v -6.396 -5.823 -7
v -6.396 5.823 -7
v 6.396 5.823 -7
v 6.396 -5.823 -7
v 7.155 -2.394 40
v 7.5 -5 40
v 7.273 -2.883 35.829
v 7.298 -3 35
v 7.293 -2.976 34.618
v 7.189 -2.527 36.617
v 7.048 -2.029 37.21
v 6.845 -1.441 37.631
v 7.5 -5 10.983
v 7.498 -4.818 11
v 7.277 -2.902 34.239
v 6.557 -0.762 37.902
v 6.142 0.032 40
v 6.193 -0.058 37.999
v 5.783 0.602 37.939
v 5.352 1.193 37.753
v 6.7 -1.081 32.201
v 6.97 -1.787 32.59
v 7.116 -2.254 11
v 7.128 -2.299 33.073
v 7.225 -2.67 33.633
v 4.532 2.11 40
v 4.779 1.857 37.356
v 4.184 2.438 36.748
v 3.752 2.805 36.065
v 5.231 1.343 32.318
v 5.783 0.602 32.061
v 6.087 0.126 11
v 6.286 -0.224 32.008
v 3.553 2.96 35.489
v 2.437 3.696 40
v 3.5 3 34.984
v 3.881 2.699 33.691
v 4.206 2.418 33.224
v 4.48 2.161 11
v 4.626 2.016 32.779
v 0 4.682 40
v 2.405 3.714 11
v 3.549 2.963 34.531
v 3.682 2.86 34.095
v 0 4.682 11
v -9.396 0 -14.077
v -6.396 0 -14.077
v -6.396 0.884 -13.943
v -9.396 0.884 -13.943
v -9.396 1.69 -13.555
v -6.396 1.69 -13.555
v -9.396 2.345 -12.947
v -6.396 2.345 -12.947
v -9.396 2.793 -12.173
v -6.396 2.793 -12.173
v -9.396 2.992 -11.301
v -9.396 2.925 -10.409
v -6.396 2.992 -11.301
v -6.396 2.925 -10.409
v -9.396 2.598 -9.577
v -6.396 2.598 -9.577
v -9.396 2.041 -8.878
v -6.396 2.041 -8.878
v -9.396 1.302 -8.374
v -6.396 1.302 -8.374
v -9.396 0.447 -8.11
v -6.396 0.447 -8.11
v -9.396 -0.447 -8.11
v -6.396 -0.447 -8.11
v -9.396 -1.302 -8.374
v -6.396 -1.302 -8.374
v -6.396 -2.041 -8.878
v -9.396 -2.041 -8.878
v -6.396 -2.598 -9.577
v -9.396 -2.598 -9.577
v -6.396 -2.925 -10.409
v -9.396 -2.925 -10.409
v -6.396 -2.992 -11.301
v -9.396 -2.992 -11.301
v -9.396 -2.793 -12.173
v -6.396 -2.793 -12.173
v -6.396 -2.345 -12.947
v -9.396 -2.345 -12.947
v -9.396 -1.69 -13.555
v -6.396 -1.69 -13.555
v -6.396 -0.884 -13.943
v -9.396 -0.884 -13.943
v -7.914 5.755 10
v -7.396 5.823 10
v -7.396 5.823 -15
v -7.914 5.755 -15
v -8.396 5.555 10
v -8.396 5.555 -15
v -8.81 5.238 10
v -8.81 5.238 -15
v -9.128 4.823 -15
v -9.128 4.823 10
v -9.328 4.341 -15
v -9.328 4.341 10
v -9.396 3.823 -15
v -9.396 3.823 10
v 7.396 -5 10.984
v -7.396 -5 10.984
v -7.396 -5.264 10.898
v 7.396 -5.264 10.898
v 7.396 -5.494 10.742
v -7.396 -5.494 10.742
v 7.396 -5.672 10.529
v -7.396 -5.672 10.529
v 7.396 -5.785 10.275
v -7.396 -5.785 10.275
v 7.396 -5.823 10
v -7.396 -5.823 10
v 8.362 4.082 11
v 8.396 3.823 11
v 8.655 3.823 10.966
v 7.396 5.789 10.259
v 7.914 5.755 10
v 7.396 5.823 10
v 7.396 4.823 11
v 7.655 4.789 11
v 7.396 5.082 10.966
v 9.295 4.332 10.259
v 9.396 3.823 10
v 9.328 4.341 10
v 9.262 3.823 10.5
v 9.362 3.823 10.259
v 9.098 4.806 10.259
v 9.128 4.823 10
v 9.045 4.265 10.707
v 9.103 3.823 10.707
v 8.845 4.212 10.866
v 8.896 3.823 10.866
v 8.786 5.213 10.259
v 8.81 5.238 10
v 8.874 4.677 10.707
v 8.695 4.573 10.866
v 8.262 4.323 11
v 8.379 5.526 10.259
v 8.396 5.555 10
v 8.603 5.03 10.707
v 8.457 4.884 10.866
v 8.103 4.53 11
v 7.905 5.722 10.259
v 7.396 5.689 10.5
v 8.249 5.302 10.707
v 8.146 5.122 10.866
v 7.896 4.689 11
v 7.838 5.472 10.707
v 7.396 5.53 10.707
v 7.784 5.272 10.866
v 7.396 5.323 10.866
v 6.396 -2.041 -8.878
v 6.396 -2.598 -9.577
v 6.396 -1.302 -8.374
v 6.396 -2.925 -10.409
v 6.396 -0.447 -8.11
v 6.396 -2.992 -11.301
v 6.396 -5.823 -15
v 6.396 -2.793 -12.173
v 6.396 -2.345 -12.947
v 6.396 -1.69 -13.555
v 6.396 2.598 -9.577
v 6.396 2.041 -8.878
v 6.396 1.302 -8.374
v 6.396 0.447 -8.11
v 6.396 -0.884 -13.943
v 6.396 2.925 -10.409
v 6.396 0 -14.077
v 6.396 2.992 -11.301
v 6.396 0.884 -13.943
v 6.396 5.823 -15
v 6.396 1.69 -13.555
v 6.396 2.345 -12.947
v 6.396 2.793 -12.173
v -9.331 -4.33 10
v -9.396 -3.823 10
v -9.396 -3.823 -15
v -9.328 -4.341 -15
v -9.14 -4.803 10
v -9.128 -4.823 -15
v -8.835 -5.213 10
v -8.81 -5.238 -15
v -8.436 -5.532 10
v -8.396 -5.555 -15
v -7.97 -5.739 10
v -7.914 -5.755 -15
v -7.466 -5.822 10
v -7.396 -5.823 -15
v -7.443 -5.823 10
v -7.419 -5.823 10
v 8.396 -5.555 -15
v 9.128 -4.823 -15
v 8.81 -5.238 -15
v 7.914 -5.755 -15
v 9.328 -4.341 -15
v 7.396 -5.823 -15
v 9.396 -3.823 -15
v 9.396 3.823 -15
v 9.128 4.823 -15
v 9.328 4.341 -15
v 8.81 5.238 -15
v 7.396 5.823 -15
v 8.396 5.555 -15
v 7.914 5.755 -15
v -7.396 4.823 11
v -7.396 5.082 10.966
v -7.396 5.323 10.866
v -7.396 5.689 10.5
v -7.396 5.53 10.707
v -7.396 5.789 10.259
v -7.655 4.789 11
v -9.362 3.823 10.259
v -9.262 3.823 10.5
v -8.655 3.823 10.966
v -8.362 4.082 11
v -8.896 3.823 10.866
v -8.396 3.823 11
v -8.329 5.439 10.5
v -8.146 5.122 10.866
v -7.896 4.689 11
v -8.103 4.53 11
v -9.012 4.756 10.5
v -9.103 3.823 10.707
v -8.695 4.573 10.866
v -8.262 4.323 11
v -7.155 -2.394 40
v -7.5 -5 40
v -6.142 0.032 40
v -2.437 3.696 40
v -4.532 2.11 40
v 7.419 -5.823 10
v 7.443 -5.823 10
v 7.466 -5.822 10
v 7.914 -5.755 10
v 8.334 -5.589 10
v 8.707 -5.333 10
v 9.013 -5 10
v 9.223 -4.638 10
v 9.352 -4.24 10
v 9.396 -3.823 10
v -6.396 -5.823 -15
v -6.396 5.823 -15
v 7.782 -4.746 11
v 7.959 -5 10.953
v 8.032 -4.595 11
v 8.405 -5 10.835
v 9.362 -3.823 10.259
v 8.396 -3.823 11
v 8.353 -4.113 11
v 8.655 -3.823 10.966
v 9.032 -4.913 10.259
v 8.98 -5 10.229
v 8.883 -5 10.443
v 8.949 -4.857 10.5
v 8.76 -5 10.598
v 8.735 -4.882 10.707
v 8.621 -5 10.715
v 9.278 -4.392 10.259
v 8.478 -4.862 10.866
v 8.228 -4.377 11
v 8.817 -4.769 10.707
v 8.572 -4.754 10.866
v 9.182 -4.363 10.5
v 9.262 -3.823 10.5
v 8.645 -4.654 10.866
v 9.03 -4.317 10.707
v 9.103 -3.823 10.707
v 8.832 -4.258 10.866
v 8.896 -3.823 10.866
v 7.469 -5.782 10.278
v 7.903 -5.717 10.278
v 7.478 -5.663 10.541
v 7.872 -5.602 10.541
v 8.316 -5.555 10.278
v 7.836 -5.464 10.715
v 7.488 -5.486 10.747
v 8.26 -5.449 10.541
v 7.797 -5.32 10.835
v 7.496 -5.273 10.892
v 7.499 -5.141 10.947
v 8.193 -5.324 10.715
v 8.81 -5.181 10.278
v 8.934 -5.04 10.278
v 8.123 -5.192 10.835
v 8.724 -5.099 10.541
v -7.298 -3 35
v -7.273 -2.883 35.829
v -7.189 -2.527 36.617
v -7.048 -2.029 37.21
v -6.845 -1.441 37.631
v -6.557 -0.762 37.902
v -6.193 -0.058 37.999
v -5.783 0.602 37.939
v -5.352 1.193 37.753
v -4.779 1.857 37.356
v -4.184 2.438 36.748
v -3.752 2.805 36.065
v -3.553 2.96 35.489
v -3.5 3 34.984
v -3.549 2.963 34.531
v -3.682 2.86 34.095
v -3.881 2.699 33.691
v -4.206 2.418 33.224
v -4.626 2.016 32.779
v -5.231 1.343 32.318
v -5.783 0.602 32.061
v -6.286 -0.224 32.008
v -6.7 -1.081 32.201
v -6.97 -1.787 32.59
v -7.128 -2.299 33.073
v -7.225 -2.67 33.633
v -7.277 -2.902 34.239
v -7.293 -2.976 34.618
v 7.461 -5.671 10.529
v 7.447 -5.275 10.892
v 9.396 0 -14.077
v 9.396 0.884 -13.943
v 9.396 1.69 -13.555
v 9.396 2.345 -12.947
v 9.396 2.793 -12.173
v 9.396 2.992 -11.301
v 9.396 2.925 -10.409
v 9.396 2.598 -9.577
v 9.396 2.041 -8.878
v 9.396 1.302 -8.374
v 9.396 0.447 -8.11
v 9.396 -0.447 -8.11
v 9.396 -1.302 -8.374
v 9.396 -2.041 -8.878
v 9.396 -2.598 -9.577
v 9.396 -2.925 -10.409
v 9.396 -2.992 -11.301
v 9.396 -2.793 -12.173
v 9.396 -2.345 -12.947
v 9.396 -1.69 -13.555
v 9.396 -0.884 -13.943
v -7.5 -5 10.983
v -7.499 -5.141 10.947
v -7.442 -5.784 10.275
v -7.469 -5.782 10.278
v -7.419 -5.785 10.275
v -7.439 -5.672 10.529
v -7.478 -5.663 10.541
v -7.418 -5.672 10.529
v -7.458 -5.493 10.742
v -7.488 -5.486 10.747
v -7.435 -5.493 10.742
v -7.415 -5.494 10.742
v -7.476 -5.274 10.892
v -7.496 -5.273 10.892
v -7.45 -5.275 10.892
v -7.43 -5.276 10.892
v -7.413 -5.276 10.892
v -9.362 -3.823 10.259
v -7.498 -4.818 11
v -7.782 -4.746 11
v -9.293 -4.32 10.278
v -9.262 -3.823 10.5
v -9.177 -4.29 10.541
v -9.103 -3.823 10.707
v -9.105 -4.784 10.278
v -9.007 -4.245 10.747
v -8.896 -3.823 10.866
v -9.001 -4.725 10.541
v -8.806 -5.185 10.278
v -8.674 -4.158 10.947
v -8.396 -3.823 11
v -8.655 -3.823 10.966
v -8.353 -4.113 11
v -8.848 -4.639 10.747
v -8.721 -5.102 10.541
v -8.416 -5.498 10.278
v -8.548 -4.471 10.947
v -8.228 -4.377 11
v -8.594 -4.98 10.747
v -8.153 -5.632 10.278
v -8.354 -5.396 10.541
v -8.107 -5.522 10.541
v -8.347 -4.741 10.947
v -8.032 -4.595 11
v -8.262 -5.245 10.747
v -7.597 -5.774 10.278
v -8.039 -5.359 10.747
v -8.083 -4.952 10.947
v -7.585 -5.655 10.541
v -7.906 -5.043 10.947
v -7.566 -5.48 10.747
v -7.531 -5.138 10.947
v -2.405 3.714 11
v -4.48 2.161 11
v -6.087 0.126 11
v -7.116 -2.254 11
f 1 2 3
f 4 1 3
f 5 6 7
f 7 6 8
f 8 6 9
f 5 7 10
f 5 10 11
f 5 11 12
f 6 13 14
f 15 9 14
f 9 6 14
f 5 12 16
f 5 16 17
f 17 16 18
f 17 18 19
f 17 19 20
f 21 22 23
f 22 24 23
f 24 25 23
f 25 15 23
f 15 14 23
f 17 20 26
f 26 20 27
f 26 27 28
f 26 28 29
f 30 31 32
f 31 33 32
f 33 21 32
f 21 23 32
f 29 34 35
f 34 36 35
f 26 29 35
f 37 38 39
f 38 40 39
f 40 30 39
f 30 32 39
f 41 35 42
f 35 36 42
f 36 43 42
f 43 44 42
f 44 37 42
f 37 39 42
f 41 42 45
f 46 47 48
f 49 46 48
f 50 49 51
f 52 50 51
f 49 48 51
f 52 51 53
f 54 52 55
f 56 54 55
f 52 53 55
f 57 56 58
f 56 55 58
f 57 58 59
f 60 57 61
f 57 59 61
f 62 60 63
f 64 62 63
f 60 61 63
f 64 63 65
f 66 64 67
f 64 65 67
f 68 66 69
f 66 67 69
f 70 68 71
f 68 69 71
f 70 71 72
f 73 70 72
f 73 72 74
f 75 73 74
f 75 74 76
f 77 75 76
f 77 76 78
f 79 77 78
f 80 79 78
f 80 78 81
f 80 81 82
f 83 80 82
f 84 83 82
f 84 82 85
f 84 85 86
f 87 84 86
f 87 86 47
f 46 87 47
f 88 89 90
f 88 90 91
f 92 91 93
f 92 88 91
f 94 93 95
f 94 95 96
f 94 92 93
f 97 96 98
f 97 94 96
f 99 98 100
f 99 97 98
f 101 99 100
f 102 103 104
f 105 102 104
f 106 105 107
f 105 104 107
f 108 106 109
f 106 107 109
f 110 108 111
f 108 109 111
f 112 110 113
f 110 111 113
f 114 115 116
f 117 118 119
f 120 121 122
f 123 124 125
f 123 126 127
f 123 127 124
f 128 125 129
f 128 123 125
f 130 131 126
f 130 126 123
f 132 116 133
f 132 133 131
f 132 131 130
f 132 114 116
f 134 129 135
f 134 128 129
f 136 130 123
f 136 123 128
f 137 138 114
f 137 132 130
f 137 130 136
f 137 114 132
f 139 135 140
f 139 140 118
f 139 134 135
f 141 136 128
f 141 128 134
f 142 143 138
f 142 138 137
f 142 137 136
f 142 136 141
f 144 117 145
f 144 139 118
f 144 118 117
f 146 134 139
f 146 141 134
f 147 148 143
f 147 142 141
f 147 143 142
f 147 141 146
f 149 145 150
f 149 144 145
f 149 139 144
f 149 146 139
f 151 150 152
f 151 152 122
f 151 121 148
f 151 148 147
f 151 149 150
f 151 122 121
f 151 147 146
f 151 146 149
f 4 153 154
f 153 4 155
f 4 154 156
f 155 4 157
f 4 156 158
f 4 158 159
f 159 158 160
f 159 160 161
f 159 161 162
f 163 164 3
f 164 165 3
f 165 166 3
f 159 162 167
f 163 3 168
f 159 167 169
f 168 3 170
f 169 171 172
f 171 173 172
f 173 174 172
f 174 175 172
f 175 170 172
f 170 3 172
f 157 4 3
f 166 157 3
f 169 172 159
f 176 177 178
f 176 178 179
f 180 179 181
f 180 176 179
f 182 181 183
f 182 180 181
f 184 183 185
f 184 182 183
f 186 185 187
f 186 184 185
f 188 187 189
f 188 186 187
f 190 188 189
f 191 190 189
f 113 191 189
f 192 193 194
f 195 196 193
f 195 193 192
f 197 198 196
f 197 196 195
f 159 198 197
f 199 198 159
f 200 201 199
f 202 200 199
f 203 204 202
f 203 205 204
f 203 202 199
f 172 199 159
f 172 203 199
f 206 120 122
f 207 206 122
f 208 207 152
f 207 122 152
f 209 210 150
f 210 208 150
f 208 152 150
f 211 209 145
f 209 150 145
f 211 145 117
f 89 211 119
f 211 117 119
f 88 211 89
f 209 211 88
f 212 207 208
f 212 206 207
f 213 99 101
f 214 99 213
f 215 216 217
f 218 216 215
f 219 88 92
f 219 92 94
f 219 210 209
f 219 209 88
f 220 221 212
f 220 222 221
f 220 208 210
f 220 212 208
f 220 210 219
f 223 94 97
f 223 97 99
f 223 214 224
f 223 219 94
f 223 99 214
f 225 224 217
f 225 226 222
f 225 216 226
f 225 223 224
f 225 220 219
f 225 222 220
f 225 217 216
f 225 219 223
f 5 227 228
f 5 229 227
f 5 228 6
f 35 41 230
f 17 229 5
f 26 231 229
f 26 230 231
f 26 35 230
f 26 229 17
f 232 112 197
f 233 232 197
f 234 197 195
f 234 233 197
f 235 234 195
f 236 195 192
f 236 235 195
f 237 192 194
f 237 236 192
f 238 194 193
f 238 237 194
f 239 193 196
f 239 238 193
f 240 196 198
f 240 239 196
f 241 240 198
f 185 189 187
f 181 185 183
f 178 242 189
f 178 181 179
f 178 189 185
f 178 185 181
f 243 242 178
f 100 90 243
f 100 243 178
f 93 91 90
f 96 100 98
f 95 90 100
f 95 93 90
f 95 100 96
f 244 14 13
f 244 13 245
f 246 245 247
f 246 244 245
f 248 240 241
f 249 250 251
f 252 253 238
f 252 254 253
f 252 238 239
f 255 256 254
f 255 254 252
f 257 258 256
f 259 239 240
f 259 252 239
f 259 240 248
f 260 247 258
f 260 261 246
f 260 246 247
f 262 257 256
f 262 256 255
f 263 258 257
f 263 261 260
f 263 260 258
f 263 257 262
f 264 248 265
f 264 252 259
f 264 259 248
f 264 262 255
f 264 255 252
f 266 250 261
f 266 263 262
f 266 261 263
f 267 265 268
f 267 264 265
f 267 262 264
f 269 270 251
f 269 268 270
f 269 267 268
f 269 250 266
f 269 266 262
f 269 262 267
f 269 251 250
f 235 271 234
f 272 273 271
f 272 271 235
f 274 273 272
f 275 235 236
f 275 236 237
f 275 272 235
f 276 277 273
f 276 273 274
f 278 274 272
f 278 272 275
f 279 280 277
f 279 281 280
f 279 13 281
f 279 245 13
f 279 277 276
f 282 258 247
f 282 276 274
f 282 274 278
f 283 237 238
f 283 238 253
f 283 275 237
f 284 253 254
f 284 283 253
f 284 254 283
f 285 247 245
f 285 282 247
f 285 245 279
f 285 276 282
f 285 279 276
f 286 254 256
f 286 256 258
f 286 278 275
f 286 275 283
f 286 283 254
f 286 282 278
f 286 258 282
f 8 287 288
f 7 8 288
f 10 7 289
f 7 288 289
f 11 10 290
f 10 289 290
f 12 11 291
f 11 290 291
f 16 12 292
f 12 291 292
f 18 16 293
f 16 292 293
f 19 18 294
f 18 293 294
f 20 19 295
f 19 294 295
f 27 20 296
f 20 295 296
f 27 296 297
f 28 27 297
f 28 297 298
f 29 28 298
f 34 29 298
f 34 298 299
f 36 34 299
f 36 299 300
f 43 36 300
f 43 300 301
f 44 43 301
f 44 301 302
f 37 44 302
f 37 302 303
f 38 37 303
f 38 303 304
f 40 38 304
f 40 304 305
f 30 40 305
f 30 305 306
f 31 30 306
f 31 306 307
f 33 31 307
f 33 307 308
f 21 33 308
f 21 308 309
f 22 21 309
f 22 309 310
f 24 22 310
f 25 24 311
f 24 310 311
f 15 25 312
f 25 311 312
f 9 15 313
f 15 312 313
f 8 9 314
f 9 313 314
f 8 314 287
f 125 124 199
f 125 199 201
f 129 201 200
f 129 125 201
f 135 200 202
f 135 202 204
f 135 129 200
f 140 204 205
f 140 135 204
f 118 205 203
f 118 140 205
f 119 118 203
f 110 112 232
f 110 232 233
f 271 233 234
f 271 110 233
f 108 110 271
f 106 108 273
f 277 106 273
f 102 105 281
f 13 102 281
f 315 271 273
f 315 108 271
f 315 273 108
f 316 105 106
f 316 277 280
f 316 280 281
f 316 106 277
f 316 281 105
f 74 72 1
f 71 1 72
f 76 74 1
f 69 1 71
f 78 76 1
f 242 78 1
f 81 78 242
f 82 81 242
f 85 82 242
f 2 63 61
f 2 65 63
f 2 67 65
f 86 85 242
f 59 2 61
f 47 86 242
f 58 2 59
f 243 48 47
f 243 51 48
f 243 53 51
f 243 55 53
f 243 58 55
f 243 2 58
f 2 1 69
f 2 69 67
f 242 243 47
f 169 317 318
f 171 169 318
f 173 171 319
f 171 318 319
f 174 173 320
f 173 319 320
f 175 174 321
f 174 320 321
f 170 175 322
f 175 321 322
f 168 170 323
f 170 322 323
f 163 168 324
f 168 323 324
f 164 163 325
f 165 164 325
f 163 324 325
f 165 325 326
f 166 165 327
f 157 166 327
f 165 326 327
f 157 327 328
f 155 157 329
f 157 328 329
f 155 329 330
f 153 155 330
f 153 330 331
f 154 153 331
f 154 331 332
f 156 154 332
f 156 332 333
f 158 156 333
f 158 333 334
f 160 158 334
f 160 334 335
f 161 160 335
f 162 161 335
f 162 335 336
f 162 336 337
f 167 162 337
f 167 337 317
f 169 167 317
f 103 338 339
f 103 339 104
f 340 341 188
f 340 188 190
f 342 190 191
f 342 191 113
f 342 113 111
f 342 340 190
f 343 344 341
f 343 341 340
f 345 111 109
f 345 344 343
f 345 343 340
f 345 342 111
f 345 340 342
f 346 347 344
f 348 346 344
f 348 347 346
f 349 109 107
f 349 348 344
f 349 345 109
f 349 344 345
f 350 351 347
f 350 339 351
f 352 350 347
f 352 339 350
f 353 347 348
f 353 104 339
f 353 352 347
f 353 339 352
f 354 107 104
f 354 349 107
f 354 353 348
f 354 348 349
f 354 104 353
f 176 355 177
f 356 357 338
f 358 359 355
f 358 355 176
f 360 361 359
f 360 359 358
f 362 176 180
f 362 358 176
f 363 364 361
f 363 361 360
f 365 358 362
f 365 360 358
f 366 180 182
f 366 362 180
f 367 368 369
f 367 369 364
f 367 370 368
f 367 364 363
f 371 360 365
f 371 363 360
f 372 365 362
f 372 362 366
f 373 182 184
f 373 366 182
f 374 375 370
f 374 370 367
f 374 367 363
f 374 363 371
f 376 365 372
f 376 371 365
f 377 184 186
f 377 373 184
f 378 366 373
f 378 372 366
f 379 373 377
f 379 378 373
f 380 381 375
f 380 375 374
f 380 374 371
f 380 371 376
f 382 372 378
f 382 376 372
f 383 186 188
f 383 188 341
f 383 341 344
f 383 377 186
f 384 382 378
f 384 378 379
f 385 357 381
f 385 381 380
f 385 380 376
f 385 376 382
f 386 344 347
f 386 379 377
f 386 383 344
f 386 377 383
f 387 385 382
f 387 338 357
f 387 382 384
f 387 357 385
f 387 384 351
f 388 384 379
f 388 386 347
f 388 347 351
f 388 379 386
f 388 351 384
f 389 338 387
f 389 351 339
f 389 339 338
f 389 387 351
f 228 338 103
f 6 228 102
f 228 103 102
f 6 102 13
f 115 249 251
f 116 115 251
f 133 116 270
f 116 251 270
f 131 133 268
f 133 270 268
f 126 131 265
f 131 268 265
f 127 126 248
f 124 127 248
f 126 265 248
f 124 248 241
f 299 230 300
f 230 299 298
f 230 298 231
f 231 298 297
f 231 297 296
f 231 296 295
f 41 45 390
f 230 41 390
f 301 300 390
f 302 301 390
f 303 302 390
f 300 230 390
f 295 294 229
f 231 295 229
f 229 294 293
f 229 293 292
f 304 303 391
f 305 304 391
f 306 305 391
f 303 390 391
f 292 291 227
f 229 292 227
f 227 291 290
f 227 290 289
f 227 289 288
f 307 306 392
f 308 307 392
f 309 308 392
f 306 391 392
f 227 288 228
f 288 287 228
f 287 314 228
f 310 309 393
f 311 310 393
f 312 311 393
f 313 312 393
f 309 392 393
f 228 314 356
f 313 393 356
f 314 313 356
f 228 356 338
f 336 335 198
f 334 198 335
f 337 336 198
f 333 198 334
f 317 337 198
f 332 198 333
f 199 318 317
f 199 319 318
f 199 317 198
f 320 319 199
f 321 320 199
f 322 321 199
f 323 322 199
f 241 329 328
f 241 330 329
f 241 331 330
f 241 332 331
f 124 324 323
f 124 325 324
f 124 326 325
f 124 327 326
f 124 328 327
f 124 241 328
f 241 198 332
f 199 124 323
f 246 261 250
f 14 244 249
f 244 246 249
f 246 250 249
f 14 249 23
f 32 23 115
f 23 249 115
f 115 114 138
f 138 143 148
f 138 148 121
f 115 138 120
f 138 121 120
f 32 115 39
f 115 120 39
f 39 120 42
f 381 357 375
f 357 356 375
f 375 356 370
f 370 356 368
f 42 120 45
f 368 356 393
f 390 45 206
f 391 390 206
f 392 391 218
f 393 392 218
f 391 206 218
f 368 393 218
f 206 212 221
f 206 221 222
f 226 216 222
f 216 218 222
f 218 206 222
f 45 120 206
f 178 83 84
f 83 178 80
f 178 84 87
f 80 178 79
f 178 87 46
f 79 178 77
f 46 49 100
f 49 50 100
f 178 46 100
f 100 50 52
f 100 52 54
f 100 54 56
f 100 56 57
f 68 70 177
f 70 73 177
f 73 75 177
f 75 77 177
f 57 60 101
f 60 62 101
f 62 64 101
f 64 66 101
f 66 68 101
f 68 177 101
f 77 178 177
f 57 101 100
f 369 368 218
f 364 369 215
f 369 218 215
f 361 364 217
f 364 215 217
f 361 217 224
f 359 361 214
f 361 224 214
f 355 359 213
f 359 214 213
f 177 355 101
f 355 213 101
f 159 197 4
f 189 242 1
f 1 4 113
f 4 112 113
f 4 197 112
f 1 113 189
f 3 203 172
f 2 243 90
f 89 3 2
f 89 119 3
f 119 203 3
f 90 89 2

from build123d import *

# Parameters (mm, degrees)
SKETCH1_W                = 15
SKETCH1_H                = 10
BOSS_EXTRUDE1_DEPTH      = 40
BOSS_EXTRUDE2_DEPTH      = 15
BOSS_EXTRUDE2_DEPTH_BACK = 11
SKETCH3_W                = 18.791763322
SKETCH3_H                = 11.646727992
SKETCH4_W                = 12.791763322
SKETCH4_H                = 8
CUT_EXTRUDE1_DEPTH       = 43.707480201
SKETCH5_R                = 3
CUT_EXTRUDE2_DEPTH       = 44.810756502
CUT_EXTRUDE3_DEPTH       = 49.282441533
CUT_EXTRUDE3_DEPTH_BACK  = 49.282441533
SKETCH6_OUTSIDE_W        = 32.648
SKETCH6_OUTSIDE_H        = 25.502
FILLET1_R                = 10
FILLET2_R                = 1
SKETCH7_R                = 3
CUT_EXTRUDE4_DEPTH       = 45.576248719


with BuildPart() as part:
    # Sketch1 → Boss-Extrude1 (new body)
    with BuildSketch(Plane.XY):
        Rectangle(SKETCH1_W, SKETCH1_H)
    extrude(amount=BOSS_EXTRUDE1_DEPTH)

    # Sketch3 → Boss-Extrude2 (add, two sides: drawn at the far end of the back side and taken through both)
    with BuildSketch(Plane(origin=(0, 0, 0), x_dir=(-1, 0, 0), z_dir=(0, 0, -1)).offset(-BOSS_EXTRUDE2_DEPTH_BACK)):
        Rectangle(SKETCH3_W, SKETCH3_H)
    extrude(amount=BOSS_EXTRUDE2_DEPTH + BOSS_EXTRUDE2_DEPTH_BACK)

    # Sketch4 → Cut-Extrude1 (cut, through all)
    with BuildSketch(Plane(origin=(0, 5.823363996, 0), x_dir=(1, 0, 0), z_dir=(0, 1, 0))):
        with Locations((0, 11)):
            Rectangle(SKETCH4_W, SKETCH4_H)
    extrude(amount=-CUT_EXTRUDE1_DEPTH, mode=Mode.SUBTRACT)

    # Sketch5 → Cut-Extrude2 (cut, through all)
    with BuildSketch(Plane.ZY.offset(7.5)):
        with Locations(Location((35, 0, 0), (0, 0, 270))):
            Circle(SKETCH5_R)
    extrude(amount=-CUT_EXTRUDE2_DEPTH, mode=Mode.SUBTRACT)

    # Sketch6 outside → Cut-Extrude3 (cut, two sides: drawn at the far end of the back side and taken through both)
    with BuildSketch(Plane(origin=(0, 0, -7), x_dir=(-1, 0, 0), z_dir=(0, 0, -1)).offset(-CUT_EXTRUDE3_DEPTH_BACK)):
        Rectangle(SKETCH6_OUTSIDE_W, SKETCH6_OUTSIDE_H)
        with BuildLine():
            Line((-7.395881661, 5.823363996), (7.395881661, 5.823363996))
            ThreePointArc((7.395881661, 5.823363996), (8.810095223, 5.237577558), (9.395881661, 3.823363996))
            Line((9.395881661, 3.823363996), (9.395881661, -3.823363996))
            ThreePointArc((9.395881661, -3.823363996), (8.810095223, -5.237577558), (7.395881661, -5.823363996))
            Line((7.395881661, -5.823363996), (-7.395881661, -5.823363996))
            ThreePointArc((-7.395881661, -5.823363996), (-8.810095223, -5.237577558), (-9.395881661, -3.823363996))
            Line((-9.395881661, -3.823363996), (-9.395881661, 3.823363996))
            ThreePointArc((-9.395881661, 3.823363996), (-8.810095223, 5.237577558), (-7.395881661, 5.823363996))
        make_face(mode=Mode.SUBTRACT)
    extrude(amount=CUT_EXTRUDE3_DEPTH + CUT_EXTRUDE3_DEPTH_BACK, mode=Mode.SUBTRACT)

    # Fillet1
    # the kernel refuses this fillet: 10 mm, written as the material it takes off along each edge
    with BuildSketch(Plane(origin=(-7.5, 5, 11), x_dir=(1, 0, 0), z_dir=(0, 0, 1))) as fillet1_piece_1:
        with BuildLine():
            CenterArc((FILLET1_R, -FILLET1_R), FILLET1_R, 90, 90)
            Line((0, -FILLET1_R), (0, 0))
            Line((0, 0), (FILLET1_R, 0))
        make_face()
    extrude(amount=54, mode=Mode.SUBTRACT)
    with BuildSketch(Plane(origin=(7.5, 5, 11), x_dir=(-1, 0, 0), z_dir=(0, 0, 1))) as fillet1_piece_2:
        with BuildLine():
            CenterArc((FILLET1_R, FILLET1_R), FILLET1_R, 180, 90)
            Line((0, FILLET1_R), (0, 0))
            Line((0, 0), (FILLET1_R, 0))
        make_face()
    extrude(amount=54, mode=Mode.SUBTRACT)

    # Fillet2
    # the kernel refuses this fillet: 1 mm, written as the material it takes off along each edge
    with BuildSketch(Plane(origin=(-7.395881661, 3.823363996, 11), x_dir=(0, 1, 0), z_dir=(1, 0, 0))) as fillet2_piece_1:
        with BuildLine():
            CenterArc((2 - FILLET2_R, -FILLET2_R), FILLET2_R, 0, 90)
            Line((2, -FILLET2_R), (2, 0))
            Line((2, 0), (2 - FILLET2_R, 0))
        make_face()
    revolve(axis=Axis((-7.395881661, 3.823363996, 11), (0, 0, 1)), revolution_arc=90, mode=Mode.SUBTRACT)
    with BuildSketch(Plane(origin=(-9.395881661, 3.823363996, 11), x_dir=(1, 0, 0), z_dir=(0, -1, 0)), Plane(origin=(9.395881661, -3.823363996, 11), x_dir=(-1, 0, 0), z_dir=(0, 1, 0))) as fillet2_piece_2:
        with BuildLine():
            CenterArc((FILLET2_R, -FILLET2_R), FILLET2_R, 90, 90)
            Line((0, -FILLET2_R), (0, 0))
            Line((0, 0), (FILLET2_R, 0))
        make_face()
    extrude(amount=7.646727992, mode=Mode.SUBTRACT)
    with BuildSketch(Plane(origin=(-7.395881661, -3.823363996, 11), x_dir=(-1, 0, 0), z_dir=(0, 1, 0))) as fillet2_piece_3_section:
        with BuildLine():
            CenterArc((2 - FILLET2_R, -FILLET2_R), FILLET2_R, 0, 90)
            Line((2, -FILLET2_R), (2, 0))
            Line((2, 0), (2 - FILLET2_R, 0))
        make_face()
    fillet2_piece_3 = revolve(axis=Axis((-7.395881661, -3.823363996, 11), (0, 0, 1)), revolution_arc=90, mode=Mode.PRIVATE)
    fillet2_piece_3 = fillet2_piece_3 - Plane(origin=(2.5, -5, 10.778934244), x_dir=(1, 0, 0), z_dir=(0, 0, -1)) * Cylinder(10, 8, mode=Mode.PRIVATE)
    fillet2_piece_3 = split(fillet2_piece_3, bisect_by=Plane(origin=(-8.996433691, -5, 10.778934244), z_dir=(0, 1, 0)), keep=Keep.TOP, mode=Mode.PRIVATE)
    add(fillet2_piece_3, mode=Mode.SUBTRACT)
    with BuildSketch(Plane(origin=(-7.395881661, -3.823363996, 11), x_dir=(-1, 0, 0), z_dir=(0, 1, 0))) as fillet2_piece_4_section:
        with BuildLine():
            CenterArc((2 - FILLET2_R, -FILLET2_R), FILLET2_R, 0, 90)
            Line((2, -FILLET2_R), (2, 0))
            Line((2, 0), (2 - FILLET2_R, 0))
        make_face()
    fillet2_piece_4 = revolve(axis=Axis((-7.395881661, -3.823363996, 11), (0, 0, 1)), revolution_arc=90, mode=Mode.PRIVATE)
    fillet2_piece_4 = fillet2_piece_4 - Plane(origin=(2.5, -5, 10.736771206), x_dir=(1, 0, 0), z_dir=(0, 0, -1)) * Cylinder(10, 8, mode=Mode.PRIVATE)
    fillet2_piece_4 = split(fillet2_piece_4, bisect_by=Plane(origin=(-8.184472941, -5, 10.736771206), z_dir=(0, -1, 0)), keep=Keep.TOP, mode=Mode.PRIVATE)
    add(fillet2_piece_4, mode=Mode.SUBTRACT)
    with BuildSketch(Plane(origin=(-7.395881661, -3.823363996, 11), x_dir=(-1, 0, 0), z_dir=(0, 1, 0))) as fillet2_piece_5_section:
        with BuildLine():
            CenterArc((2 - FILLET2_R, -FILLET2_R), FILLET2_R, 0, 90)
            Line((2, -FILLET2_R), (2, 0))
            Line((2, 0), (2 - FILLET2_R, 0))
        make_face()
    fillet2_piece_5 = revolve(axis=Axis((-7.395881661, -3.823363996, 11), (0, 0, 1)), revolution_arc=90, mode=Mode.PRIVATE)
    fillet2_piece_5 = fillet2_piece_5 & Plane(origin=(2.5, -5, 10.786120947), x_dir=(1, 0, 0), z_dir=(0, 0, -1)) * Cylinder(10, 8, mode=Mode.PRIVATE)
    fillet2_piece_5 = split(fillet2_piece_5, bisect_by=Plane(origin=(-7.438386145, -5, 10.786120947), z_dir=(0, -1, 0)), keep=Keep.TOP, mode=Mode.PRIVATE)
    add(fillet2_piece_5, mode=Mode.SUBTRACT)
    with BuildSketch(Plane(origin=(7.395881661, -3.823363996, 11), x_dir=(0, -1, 0), z_dir=(-1, 0, 0))) as fillet2_piece_6_section:
        with BuildLine():
            CenterArc((2 - FILLET2_R, -FILLET2_R), FILLET2_R, 0, 90)
            Line((2, -FILLET2_R), (2, 0))
            Line((2, 0), (2 - FILLET2_R, 0))
        make_face()
    fillet2_piece_6 = revolve(axis=Axis((7.395881661, -3.823363996, 11), (0, 0, 1)), revolution_arc=90, mode=Mode.PRIVATE)
    fillet2_piece_6 = fillet2_piece_6 & Plane(origin=(-2.5, -5, 10.786120921), x_dir=(-1, 0, 0), z_dir=(0, 0, -1)) * Cylinder(10, 8, mode=Mode.PRIVATE)
    fillet2_piece_6 = split(fillet2_piece_6, bisect_by=Plane(origin=(7.438386148, -5, 10.786120921), z_dir=(0, -1, 0)), keep=Keep.TOP, mode=Mode.PRIVATE)
    add(fillet2_piece_6, mode=Mode.SUBTRACT)
    with BuildSketch(Plane(origin=(7.395881661, -3.823363996, 11), x_dir=(0, -1, 0), z_dir=(-1, 0, 0))) as fillet2_piece_7_section:
        with BuildLine():
            CenterArc((2 - FILLET2_R, -FILLET2_R), FILLET2_R, 0, 90)
            Line((2, -FILLET2_R), (2, 0))
            Line((2, 0), (2 - FILLET2_R, 0))
        make_face()
    fillet2_piece_7 = revolve(axis=Axis((7.395881661, -3.823363996, 11), (0, 0, 1)), revolution_arc=90, mode=Mode.PRIVATE)
    fillet2_piece_7 = fillet2_piece_7 - Plane(origin=(-2.5, -5, 10.778934427), x_dir=(-1, 0, 0), z_dir=(0, 0, -1)) * Cylinder(10, 8, mode=Mode.PRIVATE)
    fillet2_piece_7 = split(fillet2_piece_7, bisect_by=Plane(origin=(8.996433978, -5, 10.778934427), z_dir=(0, 1, 0)), keep=Keep.TOP, mode=Mode.PRIVATE)
    add(fillet2_piece_7, mode=Mode.SUBTRACT)
    with BuildSketch(Plane(origin=(7.395881661, -3.823363996, 11), x_dir=(0, -1, 0), z_dir=(-1, 0, 0))) as fillet2_piece_8_section:
        with BuildLine():
            CenterArc((2 - FILLET2_R, -FILLET2_R), FILLET2_R, 0, 90)
            Line((2, -FILLET2_R), (2, 0))
            Line((2, 0), (2 - FILLET2_R, 0))
        make_face()
    fillet2_piece_8 = revolve(axis=Axis((7.395881661, -3.823363996, 11), (0, 0, 1)), revolution_arc=90, mode=Mode.PRIVATE)
    fillet2_piece_8 = fillet2_piece_8 - Plane(origin=(-2.5, -5, 10.736771126), x_dir=(-1, 0, 0), z_dir=(0, 0, -1)) * Cylinder(10, 8, mode=Mode.PRIVATE)
    fillet2_piece_8 = split(fillet2_piece_8, bisect_by=Plane(origin=(8.184472929, -5, 10.736771126), z_dir=(0, -1, 0)), keep=Keep.TOP, mode=Mode.PRIVATE)
    add(fillet2_piece_8, mode=Mode.SUBTRACT)
    with BuildSketch(Plane(origin=(7.395881661, 3.823363996, 11), x_dir=(1, 0, 0), z_dir=(0, -1, 0))) as fillet2_piece_9:
        with BuildLine():
            CenterArc((2 - FILLET2_R, -FILLET2_R), FILLET2_R, 0, 90)
            Line((2, -FILLET2_R), (2, 0))
            Line((2, 0), (2 - FILLET2_R, 0))
        make_face()
    revolve(axis=Axis((7.395881661, 3.823363996, 11), (0, 0, 1)), revolution_arc=90, mode=Mode.SUBTRACT)
    with BuildSketch(Plane(origin=(7.395881661, 5.823363996, 11), x_dir=(0, -1, 0), z_dir=(-1, 0, 0))) as fillet2_piece_10:
        with BuildLine():
            CenterArc((FILLET2_R, -FILLET2_R), FILLET2_R, 90, 90)
            Line((0, -FILLET2_R), (0, 0))
            Line((0, 0), (FILLET2_R, 0))
        make_face()
    extrude(amount=14.791763321, mode=Mode.SUBTRACT)
    with BuildSketch(Plane(origin=(-7.395881661, -5.823363996, 11), x_dir=(0, 1, 0), z_dir=(1, 0, 0))) as fillet2_piece_11_section:
        with BuildLine():
            CenterArc((FILLET2_R, -FILLET2_R), FILLET2_R, 90, 90)
            Line((0, -FILLET2_R), (0, 0))
            Line((0, 0), (FILLET2_R, 0))
        make_face()
    fillet2_piece_11 = extrude(amount=14.791763321, mode=Mode.PRIVATE)
    fillet2_piece_11 = split(fillet2_piece_11, bisect_by=Plane(origin=(0, -5, 10.769455145), z_dir=(0, -1, 0)), keep=Keep.TOP, mode=Mode.PRIVATE)
    add(fillet2_piece_11, mode=Mode.SUBTRACT)

    # Sketch7 → Cut-Extrude4 (cut, through all)
    with BuildSketch(Plane(origin=(9.395881661, 0, 0), x_dir=(0, 0, -1), z_dir=(1, 0, 0))):
        with Locations((11.076683863, 0)):
            Circle(SKETCH7_R)
    extrude(amount=-CUT_EXTRUDE4_DEPTH, mode=Mode.SUBTRACT)


solid = part.part
